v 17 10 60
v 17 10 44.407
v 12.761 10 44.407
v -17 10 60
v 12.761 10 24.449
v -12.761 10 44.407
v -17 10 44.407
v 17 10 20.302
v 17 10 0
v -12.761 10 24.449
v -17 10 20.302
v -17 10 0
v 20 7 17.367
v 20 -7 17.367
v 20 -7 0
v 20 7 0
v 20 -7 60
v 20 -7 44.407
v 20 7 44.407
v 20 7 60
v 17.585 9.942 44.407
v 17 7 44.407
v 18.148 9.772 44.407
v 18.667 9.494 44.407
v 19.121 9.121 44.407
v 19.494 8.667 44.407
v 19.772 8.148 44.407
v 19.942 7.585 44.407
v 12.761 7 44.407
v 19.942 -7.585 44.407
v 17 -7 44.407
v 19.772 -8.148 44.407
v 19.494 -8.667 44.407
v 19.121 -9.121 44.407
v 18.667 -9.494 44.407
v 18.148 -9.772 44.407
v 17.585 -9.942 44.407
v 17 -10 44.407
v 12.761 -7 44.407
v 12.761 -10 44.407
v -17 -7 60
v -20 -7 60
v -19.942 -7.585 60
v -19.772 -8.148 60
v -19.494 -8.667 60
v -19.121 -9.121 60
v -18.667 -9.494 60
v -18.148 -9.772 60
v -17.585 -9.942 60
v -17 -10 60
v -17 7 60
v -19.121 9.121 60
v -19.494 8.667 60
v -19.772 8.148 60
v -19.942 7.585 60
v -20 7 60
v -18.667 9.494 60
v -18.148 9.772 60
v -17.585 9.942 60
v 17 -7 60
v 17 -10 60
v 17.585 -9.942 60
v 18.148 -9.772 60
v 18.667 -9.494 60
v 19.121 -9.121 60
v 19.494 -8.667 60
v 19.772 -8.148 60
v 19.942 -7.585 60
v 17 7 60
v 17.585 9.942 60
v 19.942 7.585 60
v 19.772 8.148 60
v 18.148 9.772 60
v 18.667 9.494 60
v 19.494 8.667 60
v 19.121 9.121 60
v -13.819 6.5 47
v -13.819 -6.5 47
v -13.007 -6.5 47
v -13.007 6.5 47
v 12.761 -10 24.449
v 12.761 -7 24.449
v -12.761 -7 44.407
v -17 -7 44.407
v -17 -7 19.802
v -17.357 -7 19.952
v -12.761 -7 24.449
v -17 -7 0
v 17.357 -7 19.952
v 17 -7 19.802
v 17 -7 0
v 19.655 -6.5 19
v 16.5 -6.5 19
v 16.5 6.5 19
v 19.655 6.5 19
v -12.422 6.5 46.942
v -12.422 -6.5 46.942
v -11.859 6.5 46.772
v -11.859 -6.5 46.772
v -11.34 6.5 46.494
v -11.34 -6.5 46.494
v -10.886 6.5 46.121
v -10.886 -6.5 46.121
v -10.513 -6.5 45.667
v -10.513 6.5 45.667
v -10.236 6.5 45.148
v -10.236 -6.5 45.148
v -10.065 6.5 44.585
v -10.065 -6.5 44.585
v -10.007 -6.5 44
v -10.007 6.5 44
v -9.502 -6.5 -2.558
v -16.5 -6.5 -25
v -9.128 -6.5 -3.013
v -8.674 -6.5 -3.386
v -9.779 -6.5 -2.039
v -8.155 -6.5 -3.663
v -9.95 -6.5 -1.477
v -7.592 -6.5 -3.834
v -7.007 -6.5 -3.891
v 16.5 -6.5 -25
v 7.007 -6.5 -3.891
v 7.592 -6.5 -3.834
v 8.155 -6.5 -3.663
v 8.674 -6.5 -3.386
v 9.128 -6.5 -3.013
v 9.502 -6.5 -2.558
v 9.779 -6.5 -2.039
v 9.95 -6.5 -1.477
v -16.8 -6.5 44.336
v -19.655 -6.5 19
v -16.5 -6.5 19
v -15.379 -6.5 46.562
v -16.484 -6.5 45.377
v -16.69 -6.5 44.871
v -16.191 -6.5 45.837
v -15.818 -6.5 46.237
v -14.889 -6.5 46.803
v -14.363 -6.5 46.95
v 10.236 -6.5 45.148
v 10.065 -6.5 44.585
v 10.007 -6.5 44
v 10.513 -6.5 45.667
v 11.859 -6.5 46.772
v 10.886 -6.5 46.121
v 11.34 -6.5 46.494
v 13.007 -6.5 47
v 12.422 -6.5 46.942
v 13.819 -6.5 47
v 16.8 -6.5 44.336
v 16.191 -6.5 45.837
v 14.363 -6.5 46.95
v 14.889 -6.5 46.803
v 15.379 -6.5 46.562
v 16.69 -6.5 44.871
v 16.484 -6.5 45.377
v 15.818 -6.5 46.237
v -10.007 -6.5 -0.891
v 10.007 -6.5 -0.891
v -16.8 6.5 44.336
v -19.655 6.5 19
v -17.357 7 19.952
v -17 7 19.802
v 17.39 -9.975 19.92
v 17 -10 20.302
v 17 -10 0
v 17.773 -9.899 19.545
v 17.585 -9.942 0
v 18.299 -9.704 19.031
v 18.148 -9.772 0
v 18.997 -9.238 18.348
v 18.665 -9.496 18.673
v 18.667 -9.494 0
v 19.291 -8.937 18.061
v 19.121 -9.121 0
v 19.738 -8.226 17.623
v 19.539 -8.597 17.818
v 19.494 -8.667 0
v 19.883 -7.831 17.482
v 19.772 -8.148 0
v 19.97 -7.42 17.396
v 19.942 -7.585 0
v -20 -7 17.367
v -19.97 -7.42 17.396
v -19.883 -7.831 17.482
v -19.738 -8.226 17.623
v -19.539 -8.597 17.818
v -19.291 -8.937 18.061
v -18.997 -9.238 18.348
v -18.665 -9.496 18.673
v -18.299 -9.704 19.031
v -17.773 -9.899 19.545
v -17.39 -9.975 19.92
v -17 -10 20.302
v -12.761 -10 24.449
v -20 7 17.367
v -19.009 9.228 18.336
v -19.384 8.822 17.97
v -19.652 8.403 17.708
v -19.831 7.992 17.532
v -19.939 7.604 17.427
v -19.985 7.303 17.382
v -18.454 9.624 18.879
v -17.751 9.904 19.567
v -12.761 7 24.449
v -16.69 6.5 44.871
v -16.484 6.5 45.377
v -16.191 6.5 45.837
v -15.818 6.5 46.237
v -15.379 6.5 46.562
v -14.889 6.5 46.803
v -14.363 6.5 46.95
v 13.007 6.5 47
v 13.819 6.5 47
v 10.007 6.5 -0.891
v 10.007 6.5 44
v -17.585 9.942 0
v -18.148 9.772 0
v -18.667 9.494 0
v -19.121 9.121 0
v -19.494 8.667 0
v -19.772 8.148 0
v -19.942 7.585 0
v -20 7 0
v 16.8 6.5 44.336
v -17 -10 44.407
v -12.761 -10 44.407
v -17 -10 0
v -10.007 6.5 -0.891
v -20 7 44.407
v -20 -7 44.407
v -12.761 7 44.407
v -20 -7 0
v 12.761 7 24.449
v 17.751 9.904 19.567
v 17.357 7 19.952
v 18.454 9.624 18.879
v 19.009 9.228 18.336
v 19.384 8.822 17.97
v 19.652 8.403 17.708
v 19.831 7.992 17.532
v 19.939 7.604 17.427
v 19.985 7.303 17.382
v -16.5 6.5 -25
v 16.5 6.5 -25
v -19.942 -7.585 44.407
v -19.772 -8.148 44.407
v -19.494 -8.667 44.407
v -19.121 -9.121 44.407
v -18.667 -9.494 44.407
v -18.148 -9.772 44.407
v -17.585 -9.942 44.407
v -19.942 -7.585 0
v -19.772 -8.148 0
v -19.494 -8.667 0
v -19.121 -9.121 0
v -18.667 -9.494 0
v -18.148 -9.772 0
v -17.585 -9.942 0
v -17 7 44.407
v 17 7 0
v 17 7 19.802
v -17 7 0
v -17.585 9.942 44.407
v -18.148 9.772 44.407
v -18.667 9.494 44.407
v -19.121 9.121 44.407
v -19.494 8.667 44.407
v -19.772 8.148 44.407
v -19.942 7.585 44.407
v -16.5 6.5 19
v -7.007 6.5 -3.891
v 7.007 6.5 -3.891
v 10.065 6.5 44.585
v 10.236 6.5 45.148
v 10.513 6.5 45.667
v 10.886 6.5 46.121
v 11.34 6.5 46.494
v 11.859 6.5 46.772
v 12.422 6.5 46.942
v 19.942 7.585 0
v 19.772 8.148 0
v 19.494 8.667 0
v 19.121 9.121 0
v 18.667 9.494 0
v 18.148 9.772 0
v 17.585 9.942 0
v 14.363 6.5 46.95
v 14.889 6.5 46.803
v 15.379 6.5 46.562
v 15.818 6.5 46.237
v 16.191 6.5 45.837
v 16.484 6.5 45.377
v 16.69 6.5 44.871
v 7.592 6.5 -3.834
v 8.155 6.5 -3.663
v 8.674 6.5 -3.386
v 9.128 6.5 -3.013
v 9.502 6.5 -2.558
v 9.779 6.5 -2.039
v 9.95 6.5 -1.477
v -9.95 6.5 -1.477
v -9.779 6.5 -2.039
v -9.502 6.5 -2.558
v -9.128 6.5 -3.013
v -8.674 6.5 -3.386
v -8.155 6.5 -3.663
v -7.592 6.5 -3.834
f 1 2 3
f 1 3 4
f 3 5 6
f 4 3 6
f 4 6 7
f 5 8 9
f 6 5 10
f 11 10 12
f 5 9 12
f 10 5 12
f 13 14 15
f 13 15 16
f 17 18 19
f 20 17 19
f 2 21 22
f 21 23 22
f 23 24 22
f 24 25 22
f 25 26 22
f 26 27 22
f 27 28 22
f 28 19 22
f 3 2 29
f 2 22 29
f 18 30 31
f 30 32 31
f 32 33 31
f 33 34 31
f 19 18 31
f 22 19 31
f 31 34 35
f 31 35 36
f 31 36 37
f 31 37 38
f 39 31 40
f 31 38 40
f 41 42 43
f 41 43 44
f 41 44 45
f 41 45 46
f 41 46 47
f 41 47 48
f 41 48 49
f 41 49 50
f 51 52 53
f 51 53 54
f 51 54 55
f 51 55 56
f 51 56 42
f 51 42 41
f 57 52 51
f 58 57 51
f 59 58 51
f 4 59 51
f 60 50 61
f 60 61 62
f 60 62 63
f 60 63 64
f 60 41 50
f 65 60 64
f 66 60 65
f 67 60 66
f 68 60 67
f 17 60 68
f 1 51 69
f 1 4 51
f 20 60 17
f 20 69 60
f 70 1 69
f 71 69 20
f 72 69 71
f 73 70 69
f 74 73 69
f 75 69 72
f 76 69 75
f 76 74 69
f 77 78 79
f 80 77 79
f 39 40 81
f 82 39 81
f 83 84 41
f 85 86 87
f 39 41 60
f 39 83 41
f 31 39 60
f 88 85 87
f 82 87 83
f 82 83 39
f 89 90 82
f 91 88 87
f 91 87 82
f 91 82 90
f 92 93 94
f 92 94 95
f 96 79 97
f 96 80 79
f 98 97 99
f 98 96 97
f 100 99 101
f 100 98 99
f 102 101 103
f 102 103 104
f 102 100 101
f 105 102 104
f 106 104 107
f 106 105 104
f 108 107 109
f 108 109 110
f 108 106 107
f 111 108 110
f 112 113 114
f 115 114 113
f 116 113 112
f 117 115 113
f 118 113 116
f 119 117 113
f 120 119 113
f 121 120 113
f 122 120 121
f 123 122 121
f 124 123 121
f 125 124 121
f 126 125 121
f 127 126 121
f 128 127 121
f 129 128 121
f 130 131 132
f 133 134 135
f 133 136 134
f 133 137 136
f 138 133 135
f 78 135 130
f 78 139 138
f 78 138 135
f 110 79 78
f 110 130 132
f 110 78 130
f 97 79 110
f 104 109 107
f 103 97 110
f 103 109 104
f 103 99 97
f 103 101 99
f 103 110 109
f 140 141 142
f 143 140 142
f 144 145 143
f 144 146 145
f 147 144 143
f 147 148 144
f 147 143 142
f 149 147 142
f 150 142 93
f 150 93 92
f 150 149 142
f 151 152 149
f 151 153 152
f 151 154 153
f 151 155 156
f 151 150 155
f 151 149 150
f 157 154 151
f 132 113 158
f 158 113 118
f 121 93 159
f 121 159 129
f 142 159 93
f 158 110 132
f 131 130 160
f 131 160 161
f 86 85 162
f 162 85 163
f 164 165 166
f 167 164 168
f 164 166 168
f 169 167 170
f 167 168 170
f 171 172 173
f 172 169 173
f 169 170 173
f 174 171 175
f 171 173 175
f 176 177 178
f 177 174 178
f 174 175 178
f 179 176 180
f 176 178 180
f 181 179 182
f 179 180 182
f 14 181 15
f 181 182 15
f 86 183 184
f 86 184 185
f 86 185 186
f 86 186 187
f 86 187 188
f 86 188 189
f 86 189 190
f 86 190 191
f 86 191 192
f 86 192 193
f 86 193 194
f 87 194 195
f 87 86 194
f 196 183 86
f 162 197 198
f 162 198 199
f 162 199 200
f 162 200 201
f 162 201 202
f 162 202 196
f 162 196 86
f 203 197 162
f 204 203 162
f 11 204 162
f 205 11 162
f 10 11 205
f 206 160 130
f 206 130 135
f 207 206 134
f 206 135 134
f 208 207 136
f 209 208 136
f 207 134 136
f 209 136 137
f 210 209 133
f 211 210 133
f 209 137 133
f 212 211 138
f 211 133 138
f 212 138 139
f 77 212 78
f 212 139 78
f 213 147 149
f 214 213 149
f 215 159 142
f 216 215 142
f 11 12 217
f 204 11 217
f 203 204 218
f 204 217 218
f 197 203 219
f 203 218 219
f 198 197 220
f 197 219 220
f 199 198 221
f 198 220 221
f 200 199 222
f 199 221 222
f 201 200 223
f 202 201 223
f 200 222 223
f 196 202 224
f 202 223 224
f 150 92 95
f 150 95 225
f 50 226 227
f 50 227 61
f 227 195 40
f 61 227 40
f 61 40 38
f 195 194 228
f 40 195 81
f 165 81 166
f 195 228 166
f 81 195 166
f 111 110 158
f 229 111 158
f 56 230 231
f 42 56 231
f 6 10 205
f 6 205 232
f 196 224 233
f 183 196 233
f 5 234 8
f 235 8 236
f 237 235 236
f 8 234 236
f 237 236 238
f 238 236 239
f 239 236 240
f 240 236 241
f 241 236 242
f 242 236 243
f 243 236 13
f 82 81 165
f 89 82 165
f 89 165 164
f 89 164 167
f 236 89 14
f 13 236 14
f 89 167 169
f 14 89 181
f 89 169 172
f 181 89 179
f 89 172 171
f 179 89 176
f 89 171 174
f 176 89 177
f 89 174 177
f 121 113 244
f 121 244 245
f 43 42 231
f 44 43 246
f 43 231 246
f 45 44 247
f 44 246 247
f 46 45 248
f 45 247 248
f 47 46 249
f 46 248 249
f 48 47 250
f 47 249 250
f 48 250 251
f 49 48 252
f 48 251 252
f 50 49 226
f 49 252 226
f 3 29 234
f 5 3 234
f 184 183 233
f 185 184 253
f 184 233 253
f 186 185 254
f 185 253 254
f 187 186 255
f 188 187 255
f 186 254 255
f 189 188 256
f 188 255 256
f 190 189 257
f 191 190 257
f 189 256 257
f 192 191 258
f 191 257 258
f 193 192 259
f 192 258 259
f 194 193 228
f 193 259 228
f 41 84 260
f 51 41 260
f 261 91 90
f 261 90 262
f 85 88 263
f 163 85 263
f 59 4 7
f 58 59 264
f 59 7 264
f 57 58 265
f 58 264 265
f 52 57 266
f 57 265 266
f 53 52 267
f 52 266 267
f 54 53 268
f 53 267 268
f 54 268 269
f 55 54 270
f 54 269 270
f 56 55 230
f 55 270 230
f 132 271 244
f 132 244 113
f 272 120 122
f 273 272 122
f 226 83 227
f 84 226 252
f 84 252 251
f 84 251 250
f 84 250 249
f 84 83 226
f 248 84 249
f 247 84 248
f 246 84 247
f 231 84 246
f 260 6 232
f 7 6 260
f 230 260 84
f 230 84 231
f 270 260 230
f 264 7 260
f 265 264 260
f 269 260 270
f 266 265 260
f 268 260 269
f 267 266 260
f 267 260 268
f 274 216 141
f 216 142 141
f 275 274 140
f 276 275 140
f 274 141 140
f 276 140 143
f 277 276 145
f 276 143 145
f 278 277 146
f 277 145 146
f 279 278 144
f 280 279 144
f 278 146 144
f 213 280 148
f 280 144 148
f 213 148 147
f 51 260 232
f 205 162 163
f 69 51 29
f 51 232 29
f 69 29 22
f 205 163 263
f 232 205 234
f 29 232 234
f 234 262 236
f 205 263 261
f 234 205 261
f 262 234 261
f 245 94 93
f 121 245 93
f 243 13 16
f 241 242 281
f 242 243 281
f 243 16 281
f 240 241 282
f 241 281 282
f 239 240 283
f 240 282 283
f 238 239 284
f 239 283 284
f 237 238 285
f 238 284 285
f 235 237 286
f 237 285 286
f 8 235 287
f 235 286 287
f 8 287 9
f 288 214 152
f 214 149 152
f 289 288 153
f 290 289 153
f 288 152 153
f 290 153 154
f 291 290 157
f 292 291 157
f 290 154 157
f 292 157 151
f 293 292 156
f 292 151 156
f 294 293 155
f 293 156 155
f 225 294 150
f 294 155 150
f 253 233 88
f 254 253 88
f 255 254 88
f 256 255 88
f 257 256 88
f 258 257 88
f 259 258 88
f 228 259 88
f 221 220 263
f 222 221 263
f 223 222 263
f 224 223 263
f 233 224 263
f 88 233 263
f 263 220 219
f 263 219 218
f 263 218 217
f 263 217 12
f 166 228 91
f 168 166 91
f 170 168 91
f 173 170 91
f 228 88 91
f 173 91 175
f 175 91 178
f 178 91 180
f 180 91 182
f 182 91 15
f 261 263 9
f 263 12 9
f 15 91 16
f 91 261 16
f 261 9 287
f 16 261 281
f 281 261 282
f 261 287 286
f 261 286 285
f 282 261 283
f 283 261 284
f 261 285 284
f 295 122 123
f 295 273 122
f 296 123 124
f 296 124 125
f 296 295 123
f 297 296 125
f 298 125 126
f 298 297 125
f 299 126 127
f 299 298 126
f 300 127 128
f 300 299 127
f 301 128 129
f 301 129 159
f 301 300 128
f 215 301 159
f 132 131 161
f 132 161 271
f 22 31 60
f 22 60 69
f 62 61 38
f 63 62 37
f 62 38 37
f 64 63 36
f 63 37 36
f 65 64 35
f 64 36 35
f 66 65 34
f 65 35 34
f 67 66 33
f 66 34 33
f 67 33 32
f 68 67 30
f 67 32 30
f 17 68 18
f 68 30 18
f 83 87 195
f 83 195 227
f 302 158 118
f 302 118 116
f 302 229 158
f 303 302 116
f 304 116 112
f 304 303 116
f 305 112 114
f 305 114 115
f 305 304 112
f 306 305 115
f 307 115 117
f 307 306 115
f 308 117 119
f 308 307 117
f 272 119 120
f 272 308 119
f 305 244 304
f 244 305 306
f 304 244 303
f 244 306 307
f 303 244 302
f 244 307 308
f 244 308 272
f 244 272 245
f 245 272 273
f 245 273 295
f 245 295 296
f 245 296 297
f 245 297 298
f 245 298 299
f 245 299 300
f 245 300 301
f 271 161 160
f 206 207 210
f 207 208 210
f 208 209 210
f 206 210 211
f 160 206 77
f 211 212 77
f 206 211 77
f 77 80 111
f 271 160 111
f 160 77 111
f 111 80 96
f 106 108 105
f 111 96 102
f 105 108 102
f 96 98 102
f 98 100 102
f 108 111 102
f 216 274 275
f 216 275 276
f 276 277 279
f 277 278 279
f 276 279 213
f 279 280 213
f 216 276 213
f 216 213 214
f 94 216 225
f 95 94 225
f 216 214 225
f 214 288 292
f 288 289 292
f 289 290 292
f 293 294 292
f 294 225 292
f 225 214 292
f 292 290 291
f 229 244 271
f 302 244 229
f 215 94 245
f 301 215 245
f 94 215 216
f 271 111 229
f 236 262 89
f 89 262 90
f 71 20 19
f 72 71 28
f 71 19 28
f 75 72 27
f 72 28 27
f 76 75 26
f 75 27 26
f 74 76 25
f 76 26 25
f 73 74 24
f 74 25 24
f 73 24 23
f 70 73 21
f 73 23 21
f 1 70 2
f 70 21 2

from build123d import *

# Parameters (mm, degrees)
F0_W      = 34
F0_H      = 14
F1_DEPTH  = 60
F3_DEPTH  = 12.5
F4_W      = 33
F4_H      = 13
F5_DEPTH  = 47
F6_DEPTH  = 25
F8_DEPTH  = 13
F9_W      = 10.0071702135
F9_H      = 7.5427786708
F10_DEPTH = 13
F11_R     = 3
F12_SIZE  = 0.5


with BuildPart() as f1:
    # F0 (on Top) → F1 (new body)
    with BuildSketch(Plane.XY):
        with BuildLine():
            Line((-17, -10), (17, -10))
            ThreePointArc((17, -10), (19.1213203436, -9.1213203436), (20, -7))
            Line((20, -7), (20, 7))
            ThreePointArc((20, 7), (19.1213203436, 9.1213203436), (17, 10))
            Line((17, 10), (-17, 10))
            ThreePointArc((-17, 10), (-19.1213203436, 9.1213203436), (-20, 7))
            Line((-20, 7), (-20, -7))
            ThreePointArc((-20, -7), (-19.1213203436, -9.1213203436), (-17, -10))
        make_face()
        Rectangle(F0_W, F0_H, mode=Mode.SUBTRACT)
    extrude(amount=F1_DEPTH)

    # F2 (on Front) → F3 (cut, symmetric)
    with BuildSketch(Plane.XZ):
        Polygon((-25.0430125743, 44.4069132209), (-22.8498019278, 14.5792569965), (-12.7610368654, 24.4487021118), (-12.7610368654, 44.4069132209), align=None)
        Polygon((22.8498019278, 14.5792569965), (25.0430125743, 44.4069132209), (12.7610368654, 44.4069132209), (12.7610368654, 24.4487021118), align=None)
    extrude(amount=F3_DEPTH, both=True, mode=Mode.SUBTRACT)

    # F12
    f12_edges = [f1.edges().sort_by_distance(p)[0] for p in [
        (17, 0, 20.30189),
        (-17, 0, 20.30189),
    ]]
    chamfer(f12_edges, length=F12_SIZE)


with BuildPart() as f5:
    # F4 (on face) → F5 (new body)
    with BuildSketch(Plane(origin=(0, 0, 0), x_dir=(1, 0, 0), z_dir=(0, 0, -1))):
        Rectangle(F4_W, F4_H)
    extrude(amount=-F5_DEPTH)

    # F6 (add): a face of the model
    f6_faces = [f5.faces().sort_by_distance(p)[0] for p in [
        (0, 0, 0),
    ]]
    extrude(f6_faces, amount=F6_DEPTH)

    # F7 (on face) → F8 (join, through all)
    with BuildSketch(Plane.XZ.offset(6.5)):
        Polygon((-16.5, 19), (-16.5, 47), (-19.6545496583, 19), align=None)
        Polygon((19.6545496583, 19), (16.5, 47), (16.5, 19), align=None)
    extrude(amount=-F8_DEPTH)

    # F9 (on face) → F10 (cut, through all)
    with BuildSketch(Plane.XZ.offset(6.5)):
        Polygon((-10.0071702135, 47), (-10.0071702135, 19), (-10.0071702135, -3.8913467145), (0, -3.8913467145), (0, 47), align=None)
        with Locations((-5.0035851068, 50.7713893354)):
            Rectangle(F9_W, F9_H)
        with Locations((5.0035851068, 50.7713893354)):
            Rectangle(F9_W, F9_H)
        Polygon((0, 47), (0, -3.8913467145), (10.0071702135, -3.8913467145), (10.0071702135, 19), (10.0071702135, 47), align=None)
    extrude(amount=-F10_DEPTH, mode=Mode.SUBTRACT)

    # F11
    f11_edges = [f5.edges().sort_by_distance(p)[0] for p in [
        (16.5, 0, 47),
        (-16.5, 0, 47),
        (-10.00717, 0, -3.891347),
        (10.00717, 0, -3.891347),
        (10.00717, 0, 47),
        (-10.00717, 0, 47),
    ]]
    fillet(f11_edges, radius=F11_R)


solid = Compound([f1.part, f5.part])
